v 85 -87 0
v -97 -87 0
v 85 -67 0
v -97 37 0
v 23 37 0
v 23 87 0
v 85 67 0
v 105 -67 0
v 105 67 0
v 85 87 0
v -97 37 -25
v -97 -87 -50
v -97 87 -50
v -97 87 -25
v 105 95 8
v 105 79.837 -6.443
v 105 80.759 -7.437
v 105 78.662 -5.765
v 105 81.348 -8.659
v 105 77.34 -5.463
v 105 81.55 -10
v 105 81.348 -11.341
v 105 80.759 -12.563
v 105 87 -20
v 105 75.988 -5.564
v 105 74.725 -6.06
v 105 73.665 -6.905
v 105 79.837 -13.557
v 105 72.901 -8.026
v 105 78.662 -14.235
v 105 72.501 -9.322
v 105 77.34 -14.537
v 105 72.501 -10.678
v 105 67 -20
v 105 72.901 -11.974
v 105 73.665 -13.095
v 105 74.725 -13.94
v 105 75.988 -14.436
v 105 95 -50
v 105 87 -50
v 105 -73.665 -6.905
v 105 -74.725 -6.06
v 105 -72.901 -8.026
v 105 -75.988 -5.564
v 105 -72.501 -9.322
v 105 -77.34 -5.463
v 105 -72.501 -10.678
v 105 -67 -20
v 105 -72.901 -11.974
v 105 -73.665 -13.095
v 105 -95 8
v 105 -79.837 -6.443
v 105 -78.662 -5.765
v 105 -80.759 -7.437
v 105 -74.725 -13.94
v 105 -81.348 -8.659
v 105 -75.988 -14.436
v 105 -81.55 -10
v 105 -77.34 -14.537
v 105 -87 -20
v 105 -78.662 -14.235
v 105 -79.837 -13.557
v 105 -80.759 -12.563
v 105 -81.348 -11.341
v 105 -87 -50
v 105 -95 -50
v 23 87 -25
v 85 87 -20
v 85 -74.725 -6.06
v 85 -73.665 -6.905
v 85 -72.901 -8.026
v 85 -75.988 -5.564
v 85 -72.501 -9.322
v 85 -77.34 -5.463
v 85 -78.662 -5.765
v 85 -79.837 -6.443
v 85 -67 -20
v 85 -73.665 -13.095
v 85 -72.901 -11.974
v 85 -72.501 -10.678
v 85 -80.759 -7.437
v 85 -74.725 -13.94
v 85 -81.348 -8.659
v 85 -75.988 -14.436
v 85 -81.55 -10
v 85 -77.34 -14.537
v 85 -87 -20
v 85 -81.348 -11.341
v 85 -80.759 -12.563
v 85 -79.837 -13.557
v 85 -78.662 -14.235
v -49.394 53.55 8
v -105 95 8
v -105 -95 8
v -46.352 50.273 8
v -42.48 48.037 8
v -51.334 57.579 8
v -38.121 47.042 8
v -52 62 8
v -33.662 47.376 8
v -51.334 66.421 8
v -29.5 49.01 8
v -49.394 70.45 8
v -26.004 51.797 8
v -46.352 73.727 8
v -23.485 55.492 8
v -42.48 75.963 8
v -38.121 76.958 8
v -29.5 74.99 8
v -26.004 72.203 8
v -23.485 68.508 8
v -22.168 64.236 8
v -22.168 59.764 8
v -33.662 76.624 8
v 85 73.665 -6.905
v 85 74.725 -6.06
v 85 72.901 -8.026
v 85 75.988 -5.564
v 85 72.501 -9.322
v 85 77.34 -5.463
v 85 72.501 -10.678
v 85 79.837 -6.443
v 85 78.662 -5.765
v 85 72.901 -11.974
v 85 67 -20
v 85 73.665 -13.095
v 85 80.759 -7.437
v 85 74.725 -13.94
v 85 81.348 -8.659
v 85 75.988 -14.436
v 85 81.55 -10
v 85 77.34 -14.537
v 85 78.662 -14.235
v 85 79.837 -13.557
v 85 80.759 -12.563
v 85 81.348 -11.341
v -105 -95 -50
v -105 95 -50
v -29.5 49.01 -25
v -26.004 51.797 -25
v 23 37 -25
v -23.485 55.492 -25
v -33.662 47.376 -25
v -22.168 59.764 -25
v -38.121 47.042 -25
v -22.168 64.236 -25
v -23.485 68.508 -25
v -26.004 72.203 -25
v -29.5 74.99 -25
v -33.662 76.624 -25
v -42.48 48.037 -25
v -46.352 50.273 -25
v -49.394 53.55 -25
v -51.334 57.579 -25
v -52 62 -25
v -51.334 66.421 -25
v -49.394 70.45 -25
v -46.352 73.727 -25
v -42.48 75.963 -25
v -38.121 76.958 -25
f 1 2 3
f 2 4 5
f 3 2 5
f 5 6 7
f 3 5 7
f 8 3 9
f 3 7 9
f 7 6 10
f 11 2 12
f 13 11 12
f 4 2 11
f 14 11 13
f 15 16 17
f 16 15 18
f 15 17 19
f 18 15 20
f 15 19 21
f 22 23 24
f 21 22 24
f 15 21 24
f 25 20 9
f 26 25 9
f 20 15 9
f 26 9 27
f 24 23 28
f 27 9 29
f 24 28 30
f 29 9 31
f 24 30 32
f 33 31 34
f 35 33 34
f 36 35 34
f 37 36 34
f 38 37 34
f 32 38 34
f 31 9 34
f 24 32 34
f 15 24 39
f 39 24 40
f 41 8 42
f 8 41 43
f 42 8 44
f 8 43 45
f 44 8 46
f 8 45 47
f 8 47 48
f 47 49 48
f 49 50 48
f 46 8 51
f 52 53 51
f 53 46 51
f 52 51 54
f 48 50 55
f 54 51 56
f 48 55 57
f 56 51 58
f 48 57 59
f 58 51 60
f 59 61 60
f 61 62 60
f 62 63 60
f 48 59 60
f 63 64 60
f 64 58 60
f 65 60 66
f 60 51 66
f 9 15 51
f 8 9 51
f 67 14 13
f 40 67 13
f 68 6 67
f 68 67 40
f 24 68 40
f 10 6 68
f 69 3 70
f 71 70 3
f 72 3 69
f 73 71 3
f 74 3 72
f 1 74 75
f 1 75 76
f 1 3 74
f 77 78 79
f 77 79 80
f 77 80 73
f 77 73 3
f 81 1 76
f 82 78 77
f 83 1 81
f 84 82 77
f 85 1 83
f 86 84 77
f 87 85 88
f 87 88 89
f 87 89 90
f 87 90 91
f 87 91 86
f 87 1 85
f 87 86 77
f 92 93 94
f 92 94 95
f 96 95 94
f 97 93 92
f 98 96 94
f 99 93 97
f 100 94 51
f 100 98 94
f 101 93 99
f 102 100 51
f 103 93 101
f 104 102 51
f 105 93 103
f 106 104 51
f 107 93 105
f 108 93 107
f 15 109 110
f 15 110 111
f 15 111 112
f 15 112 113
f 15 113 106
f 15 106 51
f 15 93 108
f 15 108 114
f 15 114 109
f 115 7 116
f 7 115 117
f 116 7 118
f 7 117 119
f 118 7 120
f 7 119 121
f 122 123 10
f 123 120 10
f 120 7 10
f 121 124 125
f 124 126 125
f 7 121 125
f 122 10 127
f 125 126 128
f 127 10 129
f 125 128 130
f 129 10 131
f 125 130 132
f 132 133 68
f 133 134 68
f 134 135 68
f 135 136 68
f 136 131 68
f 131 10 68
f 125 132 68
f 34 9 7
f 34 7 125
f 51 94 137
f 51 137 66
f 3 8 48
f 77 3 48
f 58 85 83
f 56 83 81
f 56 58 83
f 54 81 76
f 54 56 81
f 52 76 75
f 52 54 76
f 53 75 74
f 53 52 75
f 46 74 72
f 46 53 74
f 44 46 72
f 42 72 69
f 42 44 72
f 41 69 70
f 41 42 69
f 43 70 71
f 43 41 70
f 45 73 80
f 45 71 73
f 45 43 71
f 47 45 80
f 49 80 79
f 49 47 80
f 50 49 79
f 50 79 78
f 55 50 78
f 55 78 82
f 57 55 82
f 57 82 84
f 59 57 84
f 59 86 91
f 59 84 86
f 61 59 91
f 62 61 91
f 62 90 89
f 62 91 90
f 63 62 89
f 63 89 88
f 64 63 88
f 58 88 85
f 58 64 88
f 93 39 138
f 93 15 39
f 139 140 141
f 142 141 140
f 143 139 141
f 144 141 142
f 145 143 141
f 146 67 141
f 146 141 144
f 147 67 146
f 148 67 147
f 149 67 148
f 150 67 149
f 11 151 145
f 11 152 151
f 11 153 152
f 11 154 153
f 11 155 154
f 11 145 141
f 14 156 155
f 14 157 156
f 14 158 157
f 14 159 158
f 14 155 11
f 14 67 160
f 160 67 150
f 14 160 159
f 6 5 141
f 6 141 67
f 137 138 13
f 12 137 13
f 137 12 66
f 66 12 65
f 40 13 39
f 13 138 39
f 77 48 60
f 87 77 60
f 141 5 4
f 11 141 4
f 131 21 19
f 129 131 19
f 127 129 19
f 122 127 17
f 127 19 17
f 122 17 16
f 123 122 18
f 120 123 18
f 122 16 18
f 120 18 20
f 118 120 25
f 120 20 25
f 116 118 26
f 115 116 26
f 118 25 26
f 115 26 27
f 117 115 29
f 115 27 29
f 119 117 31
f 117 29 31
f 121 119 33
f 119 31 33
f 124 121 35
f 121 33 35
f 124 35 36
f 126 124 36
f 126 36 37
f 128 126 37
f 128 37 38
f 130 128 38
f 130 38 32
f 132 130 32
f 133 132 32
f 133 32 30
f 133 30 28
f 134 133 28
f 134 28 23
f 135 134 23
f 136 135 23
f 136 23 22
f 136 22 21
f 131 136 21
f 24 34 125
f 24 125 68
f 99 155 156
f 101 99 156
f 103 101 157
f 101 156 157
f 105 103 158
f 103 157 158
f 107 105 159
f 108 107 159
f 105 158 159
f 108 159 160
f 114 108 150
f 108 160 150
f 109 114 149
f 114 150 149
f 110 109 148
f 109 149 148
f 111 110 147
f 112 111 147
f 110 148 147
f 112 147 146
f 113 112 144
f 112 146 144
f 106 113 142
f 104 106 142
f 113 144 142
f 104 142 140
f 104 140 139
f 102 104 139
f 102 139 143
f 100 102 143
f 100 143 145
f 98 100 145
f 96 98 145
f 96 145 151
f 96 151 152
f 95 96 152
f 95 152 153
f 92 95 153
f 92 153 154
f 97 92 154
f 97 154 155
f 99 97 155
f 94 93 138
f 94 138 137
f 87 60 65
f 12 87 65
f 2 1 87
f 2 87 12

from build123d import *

# Parameters (mm, degrees)
SKETCH_1_W          = 210
SKETCH_1_H          = 190
EXTRUDE_1_DEPTH     = 8
EXTRUDE_2_DEPTH     = 50
SKETCH_3_W          = 20
SKETCH_3_H          = 20
EXTRUDE_3_DEPTH     = 20
SKETCH_8_R          = 4.55
CUT_EXTRUDE_1_DEPTH = 25
SKETCH_9_W          = 120
SKETCH_9_H          = 50
EXTRUDE_4_DEPTH     = 25
SKETCH_10_R         = 15
CUT_EXTRUDE_2_DEPTH = 146.392572025


with BuildPart() as part:
    # 스케치1 → 보스-돌출1 (new body)
    with BuildSketch(Plane.XY):
        Rectangle(SKETCH_1_W, SKETCH_1_H)
    extrude(amount=EXTRUDE_1_DEPTH)

    # 스케치2 → 보스-돌출2 (add)
    with BuildSketch(Plane(origin=(0, 0, 0), x_dir=(-1, 0, 0), z_dir=(0, 0, -1))):
        Polygon((-105, 95), (105, 95), (105, -95), (-105, -95), (-105, -87), (97, -87), (97, 87), (-105, 87), align=None)
    extrude(amount=EXTRUDE_2_DEPTH)

    # 스케치3 → 보스-돌출3 (add)
    with BuildSketch(Plane(origin=(105, 0, 0), x_dir=(0, 0, -1), z_dir=(1, 0, 0))):
        with Locations((10, 77)):
            Rectangle(SKETCH_3_W, SKETCH_3_H)
    extrude_3 = extrude(amount=-EXTRUDE_3_DEPTH)

    # 스케치8 → 컷-돌출1 (cut)
    with BuildSketch(Plane(origin=(105, 0, 0), x_dir=(0, 0, -1), z_dir=(1, 0, 0))):
        with Locations(Location((10, 77, 0), (0, 0, 90))):
            Circle(SKETCH_8_R)
    cut_extrude_1 = extrude(amount=-CUT_EXTRUDE_1_DEPTH, mode=Mode.SUBTRACT)

    # 대칭 복사1: 보스-돌출3, 컷-돌출1 across plane
    add(extrude_3.mirror(Plane(origin=(0, 0, 0), x_dir=(0, 0, 1), z_dir=(0, -1, 0))))
    add(cut_extrude_1.mirror(Plane(origin=(0, 0, 0), x_dir=(0, 0, 1), z_dir=(0, -1, 0))), mode=Mode.SUBTRACT)

    # 스케치9 → 보스-돌출4 (add)
    with BuildSketch(Plane(origin=(0, 0, 0), x_dir=(-1, 0, 0), z_dir=(0, 0, -1))):
        with Locations((37, 62)):
            Rectangle(SKETCH_9_W, SKETCH_9_H)
    extrude(amount=EXTRUDE_4_DEPTH)

    # 스케치10 → 컷-돌출2 (cut, through all)
    with BuildSketch(Plane(origin=(0, 0, -25), x_dir=(-1, 0, 0), z_dir=(0, 0, -1))):
        with Locations((37, 62)):
            Circle(SKETCH_10_R)
    extrude(amount=-CUT_EXTRUDE_2_DEPTH, mode=Mode.SUBTRACT)


solid = part.part
